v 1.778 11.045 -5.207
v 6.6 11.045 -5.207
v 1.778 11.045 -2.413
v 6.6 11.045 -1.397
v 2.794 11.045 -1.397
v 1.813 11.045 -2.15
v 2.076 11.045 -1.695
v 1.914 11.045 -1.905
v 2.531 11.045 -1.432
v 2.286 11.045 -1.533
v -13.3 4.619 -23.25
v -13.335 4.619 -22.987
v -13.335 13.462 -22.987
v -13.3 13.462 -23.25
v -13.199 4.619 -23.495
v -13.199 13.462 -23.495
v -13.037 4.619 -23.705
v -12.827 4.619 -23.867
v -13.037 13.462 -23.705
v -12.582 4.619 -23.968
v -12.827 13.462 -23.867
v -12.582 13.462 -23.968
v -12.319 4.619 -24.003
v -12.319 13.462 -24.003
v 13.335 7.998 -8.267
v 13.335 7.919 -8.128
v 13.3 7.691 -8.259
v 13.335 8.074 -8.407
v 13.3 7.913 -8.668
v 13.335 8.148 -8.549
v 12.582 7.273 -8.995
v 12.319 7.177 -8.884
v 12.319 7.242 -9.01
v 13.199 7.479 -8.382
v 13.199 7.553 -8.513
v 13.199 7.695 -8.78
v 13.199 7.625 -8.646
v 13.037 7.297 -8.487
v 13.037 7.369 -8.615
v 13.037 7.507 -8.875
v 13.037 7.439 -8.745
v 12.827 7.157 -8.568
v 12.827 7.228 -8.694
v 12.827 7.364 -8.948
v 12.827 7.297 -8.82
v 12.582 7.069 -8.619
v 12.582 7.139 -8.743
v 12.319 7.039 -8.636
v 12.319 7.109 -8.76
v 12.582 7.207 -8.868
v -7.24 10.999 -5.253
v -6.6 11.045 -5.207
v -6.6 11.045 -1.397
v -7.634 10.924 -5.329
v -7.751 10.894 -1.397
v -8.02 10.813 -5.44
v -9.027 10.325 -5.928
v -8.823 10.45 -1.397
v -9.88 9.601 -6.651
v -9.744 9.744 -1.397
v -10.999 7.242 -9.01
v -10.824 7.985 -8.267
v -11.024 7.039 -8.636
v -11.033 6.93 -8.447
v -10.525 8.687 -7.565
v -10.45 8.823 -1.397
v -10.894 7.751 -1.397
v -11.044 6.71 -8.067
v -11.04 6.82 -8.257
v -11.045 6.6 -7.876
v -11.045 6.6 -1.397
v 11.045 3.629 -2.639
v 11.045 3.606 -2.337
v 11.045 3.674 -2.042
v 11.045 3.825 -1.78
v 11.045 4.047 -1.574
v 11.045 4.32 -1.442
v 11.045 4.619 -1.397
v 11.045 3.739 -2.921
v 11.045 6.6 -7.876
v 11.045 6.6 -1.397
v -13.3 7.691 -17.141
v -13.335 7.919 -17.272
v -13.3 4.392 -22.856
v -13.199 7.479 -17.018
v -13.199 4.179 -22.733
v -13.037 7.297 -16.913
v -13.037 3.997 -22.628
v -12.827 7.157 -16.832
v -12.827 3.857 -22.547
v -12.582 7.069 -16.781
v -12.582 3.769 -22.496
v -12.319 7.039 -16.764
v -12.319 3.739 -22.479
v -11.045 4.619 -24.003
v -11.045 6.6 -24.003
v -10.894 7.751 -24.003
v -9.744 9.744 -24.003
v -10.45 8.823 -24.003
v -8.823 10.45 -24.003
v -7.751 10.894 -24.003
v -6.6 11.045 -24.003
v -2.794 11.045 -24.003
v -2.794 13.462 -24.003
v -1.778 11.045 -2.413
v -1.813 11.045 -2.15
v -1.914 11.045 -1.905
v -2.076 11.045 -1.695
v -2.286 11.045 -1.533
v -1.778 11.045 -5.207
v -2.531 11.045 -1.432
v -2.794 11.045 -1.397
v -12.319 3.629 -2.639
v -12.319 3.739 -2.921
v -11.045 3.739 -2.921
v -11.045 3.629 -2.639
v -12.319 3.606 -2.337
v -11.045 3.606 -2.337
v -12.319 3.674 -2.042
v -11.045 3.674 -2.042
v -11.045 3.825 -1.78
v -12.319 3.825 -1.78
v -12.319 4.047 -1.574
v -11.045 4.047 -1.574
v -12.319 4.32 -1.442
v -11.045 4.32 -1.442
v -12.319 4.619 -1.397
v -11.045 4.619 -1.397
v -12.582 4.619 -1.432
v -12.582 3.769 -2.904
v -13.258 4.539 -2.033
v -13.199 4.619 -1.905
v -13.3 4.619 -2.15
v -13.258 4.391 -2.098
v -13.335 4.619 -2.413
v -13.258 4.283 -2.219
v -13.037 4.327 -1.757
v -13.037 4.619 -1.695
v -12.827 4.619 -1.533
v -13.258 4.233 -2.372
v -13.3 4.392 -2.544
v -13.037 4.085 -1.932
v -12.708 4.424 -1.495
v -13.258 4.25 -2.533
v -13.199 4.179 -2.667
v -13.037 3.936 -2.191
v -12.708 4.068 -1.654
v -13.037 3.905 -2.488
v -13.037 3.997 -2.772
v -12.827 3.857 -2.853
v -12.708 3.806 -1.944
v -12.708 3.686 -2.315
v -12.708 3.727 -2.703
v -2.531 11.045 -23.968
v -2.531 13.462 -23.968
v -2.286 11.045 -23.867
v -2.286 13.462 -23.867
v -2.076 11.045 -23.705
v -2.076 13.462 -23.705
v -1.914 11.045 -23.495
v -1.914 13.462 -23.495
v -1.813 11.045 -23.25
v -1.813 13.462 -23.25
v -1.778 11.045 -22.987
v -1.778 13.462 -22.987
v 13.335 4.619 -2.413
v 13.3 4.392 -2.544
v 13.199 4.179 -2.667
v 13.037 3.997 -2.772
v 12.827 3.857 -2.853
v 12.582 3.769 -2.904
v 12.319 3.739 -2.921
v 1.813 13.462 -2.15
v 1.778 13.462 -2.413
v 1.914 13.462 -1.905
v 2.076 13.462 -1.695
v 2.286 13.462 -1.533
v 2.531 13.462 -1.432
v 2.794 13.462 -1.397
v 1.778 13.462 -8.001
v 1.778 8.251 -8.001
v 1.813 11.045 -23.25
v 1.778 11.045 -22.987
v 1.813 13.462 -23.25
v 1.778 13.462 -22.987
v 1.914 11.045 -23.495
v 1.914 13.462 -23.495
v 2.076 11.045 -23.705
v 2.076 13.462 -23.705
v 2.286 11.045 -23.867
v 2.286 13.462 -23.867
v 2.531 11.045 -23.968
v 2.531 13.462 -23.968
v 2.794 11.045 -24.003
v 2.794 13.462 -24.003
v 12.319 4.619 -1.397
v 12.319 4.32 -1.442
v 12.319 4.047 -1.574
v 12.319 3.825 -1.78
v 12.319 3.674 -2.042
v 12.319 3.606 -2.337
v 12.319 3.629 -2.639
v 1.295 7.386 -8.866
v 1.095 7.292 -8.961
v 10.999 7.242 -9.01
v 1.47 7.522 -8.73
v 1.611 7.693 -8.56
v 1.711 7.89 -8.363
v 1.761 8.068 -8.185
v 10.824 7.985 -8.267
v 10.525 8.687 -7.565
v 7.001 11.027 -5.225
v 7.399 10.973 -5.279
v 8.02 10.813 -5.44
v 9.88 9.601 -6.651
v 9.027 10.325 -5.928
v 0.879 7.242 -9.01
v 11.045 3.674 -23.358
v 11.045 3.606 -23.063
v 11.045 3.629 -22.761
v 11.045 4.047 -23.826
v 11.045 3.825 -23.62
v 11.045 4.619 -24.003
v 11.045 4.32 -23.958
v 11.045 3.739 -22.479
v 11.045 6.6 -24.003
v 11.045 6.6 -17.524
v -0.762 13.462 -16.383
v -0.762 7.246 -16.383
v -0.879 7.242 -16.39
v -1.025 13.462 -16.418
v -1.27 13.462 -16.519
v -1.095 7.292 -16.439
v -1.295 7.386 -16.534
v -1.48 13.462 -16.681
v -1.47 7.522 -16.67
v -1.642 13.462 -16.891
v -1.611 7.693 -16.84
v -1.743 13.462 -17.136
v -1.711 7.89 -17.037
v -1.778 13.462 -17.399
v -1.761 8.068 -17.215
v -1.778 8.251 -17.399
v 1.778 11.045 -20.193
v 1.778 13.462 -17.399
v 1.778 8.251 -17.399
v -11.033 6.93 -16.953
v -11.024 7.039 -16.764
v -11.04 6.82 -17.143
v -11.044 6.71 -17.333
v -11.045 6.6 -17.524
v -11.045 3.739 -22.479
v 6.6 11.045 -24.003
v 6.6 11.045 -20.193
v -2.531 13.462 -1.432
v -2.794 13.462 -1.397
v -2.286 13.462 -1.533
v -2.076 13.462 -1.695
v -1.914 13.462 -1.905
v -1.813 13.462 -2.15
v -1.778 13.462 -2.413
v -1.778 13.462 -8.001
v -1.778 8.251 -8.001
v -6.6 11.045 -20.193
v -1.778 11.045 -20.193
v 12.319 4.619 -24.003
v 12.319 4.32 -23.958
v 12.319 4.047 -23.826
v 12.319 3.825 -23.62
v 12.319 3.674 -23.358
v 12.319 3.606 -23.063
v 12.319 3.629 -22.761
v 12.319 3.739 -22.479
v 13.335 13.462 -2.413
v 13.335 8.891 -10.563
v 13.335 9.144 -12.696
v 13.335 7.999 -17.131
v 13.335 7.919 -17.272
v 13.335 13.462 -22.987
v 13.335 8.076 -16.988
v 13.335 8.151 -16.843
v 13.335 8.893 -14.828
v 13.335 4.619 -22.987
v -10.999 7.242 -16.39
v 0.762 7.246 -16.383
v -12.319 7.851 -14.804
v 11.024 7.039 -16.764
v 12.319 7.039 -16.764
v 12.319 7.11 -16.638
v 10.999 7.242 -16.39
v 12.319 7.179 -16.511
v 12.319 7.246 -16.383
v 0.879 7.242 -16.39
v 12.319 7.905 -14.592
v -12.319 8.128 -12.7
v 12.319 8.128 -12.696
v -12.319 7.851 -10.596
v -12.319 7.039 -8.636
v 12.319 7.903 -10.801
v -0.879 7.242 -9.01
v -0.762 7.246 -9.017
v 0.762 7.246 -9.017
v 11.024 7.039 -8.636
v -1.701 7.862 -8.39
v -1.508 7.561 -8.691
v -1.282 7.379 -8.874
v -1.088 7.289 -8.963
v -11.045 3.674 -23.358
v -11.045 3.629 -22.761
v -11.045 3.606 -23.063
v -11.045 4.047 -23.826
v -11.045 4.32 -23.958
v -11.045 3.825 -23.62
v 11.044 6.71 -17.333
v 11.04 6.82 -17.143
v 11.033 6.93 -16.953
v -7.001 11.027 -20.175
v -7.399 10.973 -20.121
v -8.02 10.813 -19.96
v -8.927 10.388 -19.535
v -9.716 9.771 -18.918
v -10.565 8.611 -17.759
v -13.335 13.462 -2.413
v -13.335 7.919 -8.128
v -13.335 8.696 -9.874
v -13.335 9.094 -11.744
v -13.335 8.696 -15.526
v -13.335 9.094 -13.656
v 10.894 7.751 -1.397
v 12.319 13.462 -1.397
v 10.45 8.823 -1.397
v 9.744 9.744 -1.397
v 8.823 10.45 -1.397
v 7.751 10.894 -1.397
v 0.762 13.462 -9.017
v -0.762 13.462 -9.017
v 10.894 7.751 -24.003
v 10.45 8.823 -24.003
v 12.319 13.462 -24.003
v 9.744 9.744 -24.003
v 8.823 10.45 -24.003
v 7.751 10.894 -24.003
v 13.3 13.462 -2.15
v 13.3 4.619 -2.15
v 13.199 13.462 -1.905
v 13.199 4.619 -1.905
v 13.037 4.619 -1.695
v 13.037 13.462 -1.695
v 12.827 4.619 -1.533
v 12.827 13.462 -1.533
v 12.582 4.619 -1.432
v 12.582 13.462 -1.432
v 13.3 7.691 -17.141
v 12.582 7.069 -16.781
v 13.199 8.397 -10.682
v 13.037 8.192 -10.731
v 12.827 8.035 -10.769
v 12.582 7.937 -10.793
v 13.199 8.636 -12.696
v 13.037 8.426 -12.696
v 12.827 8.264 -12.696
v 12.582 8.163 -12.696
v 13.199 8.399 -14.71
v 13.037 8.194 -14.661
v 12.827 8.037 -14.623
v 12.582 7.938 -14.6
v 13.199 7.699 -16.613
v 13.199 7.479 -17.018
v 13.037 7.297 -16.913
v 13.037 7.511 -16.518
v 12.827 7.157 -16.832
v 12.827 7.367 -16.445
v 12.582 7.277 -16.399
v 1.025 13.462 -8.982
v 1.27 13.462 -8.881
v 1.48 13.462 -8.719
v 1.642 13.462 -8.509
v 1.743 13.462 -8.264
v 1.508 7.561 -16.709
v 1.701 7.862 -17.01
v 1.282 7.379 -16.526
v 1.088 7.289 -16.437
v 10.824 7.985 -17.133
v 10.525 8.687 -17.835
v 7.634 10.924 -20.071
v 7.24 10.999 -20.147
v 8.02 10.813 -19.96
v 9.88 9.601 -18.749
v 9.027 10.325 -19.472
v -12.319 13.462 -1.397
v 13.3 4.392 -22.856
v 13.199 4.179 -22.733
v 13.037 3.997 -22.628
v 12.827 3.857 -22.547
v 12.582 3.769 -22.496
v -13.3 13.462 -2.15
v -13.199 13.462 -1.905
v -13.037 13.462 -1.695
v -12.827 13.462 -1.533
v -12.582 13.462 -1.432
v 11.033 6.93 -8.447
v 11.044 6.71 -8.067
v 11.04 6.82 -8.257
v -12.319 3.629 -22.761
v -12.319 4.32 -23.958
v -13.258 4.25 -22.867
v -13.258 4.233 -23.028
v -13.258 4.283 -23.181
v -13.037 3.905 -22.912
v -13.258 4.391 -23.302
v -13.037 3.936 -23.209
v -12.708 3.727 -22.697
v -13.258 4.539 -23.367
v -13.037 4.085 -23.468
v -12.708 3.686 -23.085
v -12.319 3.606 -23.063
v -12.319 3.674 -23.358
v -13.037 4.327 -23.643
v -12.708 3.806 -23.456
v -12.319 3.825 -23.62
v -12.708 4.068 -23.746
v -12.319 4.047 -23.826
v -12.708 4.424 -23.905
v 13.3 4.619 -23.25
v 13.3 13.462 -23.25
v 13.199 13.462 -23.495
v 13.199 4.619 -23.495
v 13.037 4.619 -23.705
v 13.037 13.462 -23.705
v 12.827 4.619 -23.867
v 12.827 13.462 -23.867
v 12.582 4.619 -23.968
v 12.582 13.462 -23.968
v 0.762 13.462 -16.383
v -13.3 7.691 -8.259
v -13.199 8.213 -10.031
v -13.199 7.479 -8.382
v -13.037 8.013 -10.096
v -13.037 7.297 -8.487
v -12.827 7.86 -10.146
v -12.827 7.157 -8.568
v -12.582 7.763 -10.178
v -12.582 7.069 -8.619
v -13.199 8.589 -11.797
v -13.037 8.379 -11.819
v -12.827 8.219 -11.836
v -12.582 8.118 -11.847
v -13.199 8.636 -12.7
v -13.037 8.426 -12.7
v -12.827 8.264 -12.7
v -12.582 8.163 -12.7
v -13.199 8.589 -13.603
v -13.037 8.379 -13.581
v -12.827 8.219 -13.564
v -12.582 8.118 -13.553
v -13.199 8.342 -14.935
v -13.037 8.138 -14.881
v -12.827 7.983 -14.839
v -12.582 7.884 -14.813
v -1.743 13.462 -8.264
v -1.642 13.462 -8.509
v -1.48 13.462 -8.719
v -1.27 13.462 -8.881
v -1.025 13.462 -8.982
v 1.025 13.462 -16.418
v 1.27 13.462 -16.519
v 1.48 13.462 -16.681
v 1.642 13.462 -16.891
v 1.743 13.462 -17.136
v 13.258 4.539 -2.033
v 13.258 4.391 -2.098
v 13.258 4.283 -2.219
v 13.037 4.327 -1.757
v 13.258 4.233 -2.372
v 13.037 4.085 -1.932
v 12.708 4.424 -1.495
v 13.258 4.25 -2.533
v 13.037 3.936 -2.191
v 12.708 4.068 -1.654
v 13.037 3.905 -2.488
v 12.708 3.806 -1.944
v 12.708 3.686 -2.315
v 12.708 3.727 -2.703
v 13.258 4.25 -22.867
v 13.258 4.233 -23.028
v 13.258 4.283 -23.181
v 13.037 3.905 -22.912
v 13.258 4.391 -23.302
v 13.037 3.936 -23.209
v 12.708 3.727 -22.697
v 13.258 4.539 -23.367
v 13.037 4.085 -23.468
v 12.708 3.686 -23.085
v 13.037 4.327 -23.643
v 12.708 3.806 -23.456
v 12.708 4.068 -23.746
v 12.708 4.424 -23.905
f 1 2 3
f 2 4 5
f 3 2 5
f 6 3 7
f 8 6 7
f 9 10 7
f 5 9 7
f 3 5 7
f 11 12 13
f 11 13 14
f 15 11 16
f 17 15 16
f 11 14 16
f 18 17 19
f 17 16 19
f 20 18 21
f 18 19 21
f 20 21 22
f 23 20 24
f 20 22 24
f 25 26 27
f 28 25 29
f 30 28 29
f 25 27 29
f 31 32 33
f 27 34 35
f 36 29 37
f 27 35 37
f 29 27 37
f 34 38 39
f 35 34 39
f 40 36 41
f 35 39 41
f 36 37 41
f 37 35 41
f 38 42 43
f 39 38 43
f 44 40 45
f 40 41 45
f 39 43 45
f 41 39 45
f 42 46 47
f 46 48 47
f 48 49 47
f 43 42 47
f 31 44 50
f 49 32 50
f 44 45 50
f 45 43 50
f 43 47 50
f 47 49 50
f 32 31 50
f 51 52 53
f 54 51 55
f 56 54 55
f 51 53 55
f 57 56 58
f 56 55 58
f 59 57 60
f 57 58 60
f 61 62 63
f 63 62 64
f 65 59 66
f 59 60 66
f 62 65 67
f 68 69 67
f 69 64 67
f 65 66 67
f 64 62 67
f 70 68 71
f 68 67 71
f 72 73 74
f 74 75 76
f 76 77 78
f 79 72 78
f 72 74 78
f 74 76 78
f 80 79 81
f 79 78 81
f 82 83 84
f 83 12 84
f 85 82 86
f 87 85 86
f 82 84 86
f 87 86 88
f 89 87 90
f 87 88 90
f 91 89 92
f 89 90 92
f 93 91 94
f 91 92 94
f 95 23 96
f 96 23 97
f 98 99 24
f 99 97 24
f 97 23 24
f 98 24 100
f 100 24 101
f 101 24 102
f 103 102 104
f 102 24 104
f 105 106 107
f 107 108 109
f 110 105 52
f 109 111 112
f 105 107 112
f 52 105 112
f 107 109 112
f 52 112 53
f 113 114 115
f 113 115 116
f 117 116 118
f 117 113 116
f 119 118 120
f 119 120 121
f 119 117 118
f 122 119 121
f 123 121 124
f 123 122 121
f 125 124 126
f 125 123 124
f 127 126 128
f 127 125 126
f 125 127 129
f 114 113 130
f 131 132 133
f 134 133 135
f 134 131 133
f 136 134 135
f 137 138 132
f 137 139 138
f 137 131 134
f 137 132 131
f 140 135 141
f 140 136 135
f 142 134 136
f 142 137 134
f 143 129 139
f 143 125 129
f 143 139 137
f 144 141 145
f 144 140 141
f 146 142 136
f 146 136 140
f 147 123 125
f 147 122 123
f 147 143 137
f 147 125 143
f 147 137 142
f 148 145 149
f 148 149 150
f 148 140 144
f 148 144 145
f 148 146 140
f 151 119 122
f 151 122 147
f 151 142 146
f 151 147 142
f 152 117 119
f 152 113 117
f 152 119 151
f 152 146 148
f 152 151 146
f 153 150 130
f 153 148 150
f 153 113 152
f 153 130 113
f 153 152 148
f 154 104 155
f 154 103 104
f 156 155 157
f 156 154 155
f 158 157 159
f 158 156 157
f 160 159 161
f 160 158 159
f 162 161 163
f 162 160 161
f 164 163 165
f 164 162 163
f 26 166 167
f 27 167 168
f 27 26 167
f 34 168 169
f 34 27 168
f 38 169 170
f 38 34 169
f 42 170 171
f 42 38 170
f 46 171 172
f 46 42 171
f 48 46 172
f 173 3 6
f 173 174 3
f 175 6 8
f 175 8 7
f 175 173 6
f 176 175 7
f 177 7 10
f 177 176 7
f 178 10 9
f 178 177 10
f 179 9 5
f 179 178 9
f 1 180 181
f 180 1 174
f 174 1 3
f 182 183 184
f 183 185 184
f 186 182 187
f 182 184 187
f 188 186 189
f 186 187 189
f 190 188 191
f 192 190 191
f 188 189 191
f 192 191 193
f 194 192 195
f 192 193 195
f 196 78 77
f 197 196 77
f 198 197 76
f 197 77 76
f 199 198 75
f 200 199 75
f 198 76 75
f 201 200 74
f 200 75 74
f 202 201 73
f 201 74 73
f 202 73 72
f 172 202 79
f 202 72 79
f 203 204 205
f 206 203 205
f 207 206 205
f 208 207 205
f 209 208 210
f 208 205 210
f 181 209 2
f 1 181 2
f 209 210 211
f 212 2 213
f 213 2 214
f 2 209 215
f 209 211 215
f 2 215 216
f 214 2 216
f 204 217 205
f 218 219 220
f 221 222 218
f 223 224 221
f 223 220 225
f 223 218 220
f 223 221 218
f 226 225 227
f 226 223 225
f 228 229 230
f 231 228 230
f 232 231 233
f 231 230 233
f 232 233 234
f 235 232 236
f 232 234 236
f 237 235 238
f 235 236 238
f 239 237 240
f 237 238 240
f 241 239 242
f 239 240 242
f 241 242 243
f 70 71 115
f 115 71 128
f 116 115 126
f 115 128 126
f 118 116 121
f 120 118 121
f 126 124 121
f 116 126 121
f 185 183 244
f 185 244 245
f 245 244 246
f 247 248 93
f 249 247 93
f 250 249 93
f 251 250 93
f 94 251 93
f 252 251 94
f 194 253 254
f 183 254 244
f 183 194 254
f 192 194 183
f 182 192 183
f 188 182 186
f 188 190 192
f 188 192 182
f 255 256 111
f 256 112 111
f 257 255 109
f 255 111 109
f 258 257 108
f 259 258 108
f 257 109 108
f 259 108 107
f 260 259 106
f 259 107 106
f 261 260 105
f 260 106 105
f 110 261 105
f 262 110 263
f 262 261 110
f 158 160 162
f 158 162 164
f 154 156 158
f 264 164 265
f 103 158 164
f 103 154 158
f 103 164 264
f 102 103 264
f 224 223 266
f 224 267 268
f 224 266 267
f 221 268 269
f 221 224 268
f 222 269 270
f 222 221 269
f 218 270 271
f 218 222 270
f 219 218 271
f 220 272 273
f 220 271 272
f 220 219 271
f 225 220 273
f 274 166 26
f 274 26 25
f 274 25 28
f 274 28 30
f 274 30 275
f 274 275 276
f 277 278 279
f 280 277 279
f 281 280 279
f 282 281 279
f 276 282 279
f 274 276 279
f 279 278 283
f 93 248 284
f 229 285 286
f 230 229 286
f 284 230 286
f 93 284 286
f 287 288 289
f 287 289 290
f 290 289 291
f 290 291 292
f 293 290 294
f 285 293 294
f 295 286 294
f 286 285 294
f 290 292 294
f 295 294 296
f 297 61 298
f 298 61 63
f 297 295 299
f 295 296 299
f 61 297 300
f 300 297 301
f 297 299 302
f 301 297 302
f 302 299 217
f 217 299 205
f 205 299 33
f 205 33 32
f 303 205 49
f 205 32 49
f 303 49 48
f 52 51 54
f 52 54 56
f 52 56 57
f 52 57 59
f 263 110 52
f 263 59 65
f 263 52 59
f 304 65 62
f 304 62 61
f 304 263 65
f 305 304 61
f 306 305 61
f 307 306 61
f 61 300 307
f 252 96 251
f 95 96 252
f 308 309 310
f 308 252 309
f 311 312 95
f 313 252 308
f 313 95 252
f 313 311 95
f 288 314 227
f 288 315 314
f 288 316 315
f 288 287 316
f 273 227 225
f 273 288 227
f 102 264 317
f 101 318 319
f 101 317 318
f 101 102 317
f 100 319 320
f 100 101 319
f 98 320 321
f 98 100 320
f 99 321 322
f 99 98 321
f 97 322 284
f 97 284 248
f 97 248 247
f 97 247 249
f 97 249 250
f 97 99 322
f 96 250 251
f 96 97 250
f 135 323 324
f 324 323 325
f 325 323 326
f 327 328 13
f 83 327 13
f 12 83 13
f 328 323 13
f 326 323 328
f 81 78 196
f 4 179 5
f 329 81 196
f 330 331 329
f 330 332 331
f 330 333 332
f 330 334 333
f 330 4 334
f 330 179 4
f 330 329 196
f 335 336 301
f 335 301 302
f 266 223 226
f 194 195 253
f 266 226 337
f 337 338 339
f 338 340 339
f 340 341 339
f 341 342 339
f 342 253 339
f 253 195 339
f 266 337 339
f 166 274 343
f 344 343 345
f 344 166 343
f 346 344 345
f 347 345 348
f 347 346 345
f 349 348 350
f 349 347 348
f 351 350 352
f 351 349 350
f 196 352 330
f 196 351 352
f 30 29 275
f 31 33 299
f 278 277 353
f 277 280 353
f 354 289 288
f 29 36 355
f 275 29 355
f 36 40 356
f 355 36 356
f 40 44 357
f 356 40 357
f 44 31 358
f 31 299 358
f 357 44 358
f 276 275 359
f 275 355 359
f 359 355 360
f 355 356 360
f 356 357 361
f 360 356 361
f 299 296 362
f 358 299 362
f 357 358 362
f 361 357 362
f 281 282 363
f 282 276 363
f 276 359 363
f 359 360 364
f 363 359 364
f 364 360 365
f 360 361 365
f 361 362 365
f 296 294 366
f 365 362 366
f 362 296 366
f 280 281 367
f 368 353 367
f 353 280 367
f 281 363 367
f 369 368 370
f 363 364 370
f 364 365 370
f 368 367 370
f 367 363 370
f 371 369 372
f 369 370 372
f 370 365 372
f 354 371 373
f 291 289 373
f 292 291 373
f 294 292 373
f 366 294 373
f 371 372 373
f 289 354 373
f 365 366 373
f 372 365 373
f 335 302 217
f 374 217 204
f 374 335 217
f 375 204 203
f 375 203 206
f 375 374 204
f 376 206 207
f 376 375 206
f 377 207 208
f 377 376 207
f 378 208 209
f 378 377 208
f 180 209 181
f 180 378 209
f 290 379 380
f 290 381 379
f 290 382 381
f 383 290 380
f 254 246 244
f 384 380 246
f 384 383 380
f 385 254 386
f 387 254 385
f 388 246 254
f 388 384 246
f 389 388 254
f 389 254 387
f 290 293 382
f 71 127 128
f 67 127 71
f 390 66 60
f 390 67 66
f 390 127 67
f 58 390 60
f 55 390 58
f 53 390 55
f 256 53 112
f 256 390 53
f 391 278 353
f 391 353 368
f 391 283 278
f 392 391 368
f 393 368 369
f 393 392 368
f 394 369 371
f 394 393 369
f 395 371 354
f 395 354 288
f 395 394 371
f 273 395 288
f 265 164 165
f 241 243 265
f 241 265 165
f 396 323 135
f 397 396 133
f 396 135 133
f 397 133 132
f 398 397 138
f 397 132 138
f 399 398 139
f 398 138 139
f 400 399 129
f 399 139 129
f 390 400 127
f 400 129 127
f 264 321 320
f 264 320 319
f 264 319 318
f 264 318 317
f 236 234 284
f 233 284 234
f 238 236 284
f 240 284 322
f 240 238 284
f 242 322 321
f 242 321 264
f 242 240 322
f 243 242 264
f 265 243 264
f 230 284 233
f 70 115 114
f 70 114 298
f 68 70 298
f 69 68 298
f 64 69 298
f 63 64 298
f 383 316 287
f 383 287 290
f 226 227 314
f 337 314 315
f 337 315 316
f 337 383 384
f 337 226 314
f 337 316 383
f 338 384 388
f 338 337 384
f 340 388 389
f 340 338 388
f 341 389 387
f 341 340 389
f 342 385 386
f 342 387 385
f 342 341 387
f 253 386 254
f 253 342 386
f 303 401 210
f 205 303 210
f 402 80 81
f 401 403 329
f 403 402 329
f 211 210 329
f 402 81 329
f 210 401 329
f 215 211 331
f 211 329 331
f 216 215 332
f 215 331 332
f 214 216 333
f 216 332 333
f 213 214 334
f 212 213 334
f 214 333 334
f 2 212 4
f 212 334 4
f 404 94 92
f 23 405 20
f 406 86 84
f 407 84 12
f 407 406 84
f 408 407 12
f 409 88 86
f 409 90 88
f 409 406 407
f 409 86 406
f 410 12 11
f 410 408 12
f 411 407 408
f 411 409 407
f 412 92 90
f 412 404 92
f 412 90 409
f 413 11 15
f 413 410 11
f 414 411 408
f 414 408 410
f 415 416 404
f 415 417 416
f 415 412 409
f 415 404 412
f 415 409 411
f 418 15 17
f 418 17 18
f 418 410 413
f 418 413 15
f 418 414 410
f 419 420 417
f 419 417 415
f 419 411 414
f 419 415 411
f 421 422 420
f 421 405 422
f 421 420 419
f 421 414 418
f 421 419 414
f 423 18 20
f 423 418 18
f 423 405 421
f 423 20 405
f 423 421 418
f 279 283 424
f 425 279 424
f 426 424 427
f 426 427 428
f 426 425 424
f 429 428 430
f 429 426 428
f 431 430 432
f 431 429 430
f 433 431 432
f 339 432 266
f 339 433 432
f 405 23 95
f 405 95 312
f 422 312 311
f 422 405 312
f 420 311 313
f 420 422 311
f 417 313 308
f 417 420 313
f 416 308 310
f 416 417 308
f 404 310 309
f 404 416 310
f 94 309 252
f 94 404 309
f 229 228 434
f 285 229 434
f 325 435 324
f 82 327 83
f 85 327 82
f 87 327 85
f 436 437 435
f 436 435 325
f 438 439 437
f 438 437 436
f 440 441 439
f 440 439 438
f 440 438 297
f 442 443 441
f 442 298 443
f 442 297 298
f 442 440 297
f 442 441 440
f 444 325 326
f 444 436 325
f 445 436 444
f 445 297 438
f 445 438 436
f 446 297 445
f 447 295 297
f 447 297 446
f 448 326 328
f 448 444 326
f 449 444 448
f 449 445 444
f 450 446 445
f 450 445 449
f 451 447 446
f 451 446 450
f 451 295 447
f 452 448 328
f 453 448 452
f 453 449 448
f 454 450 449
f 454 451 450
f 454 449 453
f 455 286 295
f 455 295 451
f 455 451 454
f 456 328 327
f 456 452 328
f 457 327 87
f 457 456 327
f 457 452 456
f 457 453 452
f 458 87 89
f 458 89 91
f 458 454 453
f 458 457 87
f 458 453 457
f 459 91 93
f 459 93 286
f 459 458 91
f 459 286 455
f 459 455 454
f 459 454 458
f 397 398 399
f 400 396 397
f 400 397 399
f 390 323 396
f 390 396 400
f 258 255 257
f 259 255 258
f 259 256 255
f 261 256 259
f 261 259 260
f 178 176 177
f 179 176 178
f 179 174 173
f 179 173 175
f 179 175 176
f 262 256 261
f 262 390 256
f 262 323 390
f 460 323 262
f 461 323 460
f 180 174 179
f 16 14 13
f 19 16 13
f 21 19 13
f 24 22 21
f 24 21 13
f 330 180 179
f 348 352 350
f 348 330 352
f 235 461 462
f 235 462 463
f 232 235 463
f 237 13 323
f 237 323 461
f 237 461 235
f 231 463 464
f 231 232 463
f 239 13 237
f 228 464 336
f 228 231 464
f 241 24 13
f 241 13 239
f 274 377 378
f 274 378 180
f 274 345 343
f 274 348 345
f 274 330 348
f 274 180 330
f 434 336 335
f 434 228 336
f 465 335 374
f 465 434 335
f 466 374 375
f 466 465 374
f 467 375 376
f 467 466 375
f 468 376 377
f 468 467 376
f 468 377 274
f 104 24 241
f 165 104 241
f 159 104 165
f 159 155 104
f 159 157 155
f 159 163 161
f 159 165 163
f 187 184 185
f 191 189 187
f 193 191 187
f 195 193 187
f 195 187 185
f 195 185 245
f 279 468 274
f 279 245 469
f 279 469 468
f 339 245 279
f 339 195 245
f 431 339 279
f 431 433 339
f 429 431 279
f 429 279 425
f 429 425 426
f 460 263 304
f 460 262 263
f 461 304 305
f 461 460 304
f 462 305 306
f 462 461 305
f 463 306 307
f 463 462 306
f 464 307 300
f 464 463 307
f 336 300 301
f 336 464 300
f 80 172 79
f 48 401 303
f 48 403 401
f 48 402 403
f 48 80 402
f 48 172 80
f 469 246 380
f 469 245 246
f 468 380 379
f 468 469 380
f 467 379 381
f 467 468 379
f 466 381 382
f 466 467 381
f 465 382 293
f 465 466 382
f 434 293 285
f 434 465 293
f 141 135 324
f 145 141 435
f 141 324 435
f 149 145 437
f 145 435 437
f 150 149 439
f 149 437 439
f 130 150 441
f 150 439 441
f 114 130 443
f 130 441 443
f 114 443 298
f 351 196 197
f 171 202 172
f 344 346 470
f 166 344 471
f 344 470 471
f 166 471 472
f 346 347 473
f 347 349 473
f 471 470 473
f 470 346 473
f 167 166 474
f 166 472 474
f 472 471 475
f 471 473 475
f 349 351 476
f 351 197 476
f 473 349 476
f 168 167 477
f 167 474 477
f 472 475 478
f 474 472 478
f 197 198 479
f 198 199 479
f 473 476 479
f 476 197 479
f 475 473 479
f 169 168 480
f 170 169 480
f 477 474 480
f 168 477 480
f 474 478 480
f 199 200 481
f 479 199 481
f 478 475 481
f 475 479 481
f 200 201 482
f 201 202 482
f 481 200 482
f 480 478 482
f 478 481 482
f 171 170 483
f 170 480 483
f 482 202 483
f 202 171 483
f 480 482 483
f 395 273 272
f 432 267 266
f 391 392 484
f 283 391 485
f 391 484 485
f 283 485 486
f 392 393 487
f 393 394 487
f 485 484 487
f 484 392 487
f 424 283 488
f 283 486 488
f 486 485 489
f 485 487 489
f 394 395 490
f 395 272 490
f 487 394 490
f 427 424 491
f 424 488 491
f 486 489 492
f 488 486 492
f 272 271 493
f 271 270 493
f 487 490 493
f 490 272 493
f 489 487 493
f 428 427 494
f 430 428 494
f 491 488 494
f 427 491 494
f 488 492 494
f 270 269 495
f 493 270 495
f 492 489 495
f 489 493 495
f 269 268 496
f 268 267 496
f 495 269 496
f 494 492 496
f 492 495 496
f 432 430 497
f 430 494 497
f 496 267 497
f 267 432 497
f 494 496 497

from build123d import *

# Parameters (mm, degrees)
SKETCH23_W          = 26.67
SKETCH23_H          = 22.606
BOSS_EXTRUDE8_DEPTH = 13.208
CUT_EXTRUDE1_DEPTH  = 7.62
SKETCH27_R          = 8.128
CUT_EXTRUDE3_DEPTH  = 38.1
CUT_EXTRUDE4_DEPTH  = 76.2
CHAMFER1_SIZE       = 3.81
FILLET1_R           = 1.016
FILLET2_R           = 1.016
FILLET4_R           = 1.016


with BuildPart() as part:
    # Sketch23 → Boss-Extrude8 (new body)
    with BuildSketch(Plane(origin=(0, 13.462, 0), x_dir=(1, 0, 0), z_dir=(0, 1, 0))):
        with Locations((0, 12.7)):
            Rectangle(SKETCH23_W, SKETCH23_H)
    extrude(amount=-BOSS_EXTRUDE8_DEPTH)

    # Sketch25 → Cut-Extrude1 (cut)
    with BuildSketch(Plane(origin=(0, 0, -24.003), x_dir=(-1, 0, 0), z_dir=(0, 0, -1))):
        with BuildLine():
            Line((1.778, 13.462), (1.778, 11.045488249))
            Line((1.778, 11.045488249), (6.600488249, 11.045488249))
            ThreePointArc((6.600488249, 11.045488249), (9.743577891, 9.743577891), (11.045488249, 6.600488249))
            Line((11.045488249, 6.600488249), (11.045488249, 0.254))
            Line((11.045488249, 0.254), (-11.045488249, 0.254))
            Line((-11.045488249, 0.254), (-11.045488249, 6.600488249))
            ThreePointArc((-11.045488249, 6.600488249), (-9.743577891, 9.743577891), (-6.600488249, 11.045488249))
            Line((-6.600488249, 11.045488249), (-1.778, 11.045488249))
            Line((-1.778, 11.045488249), (-1.778, 13.462))
            ThreePointArc((-1.778, 13.462), (0, 15.24), (1.778, 13.462))
        make_face()
    cut_extrude1 = extrude(amount=-CUT_EXTRUDE1_DEPTH, mode=Mode.SUBTRACT)

    # Sketch27 → Cut-Extrude3 (cut, symmetric)
    with BuildSketch(Plane(origin=(0, 0, 0), x_dir=(0, 0, -1), z_dir=(1, 0, 0))):
        with Locations((12.7, 0)):
            Circle(SKETCH27_R)
    extrude(amount=CUT_EXTRUDE3_DEPTH, both=True, mode=Mode.SUBTRACT)

    # Sketch28 → Cut-Extrude4 (cut)
    with BuildSketch(Plane(origin=(13.335, 0, 0), x_dir=(0, 0, -1), z_dir=(1, 0, 0))):
        with BuildLine():
            Line((1.397, 2.859615883), (8.636, 7.039054482))
            ThreePointArc((8.636, 7.039054482), (12.7, 8.128), (16.764, 7.039054482))
            Line((16.764, 7.039054482), (24.003, 2.859615883))
            Line((24.003, 2.859615883), (24.003, 0.254))
            Line((24.003, 0.254), (1.397, 0.254))
            Line((1.397, 0.254), (1.397, 2.859615883))
        make_face()
    extrude(amount=-CUT_EXTRUDE4_DEPTH, mode=Mode.SUBTRACT)

    # Mirror1: Cut-Extrude1 across plane
    add(cut_extrude1.mirror(Plane.XY.offset(-12.7)), mode=Mode.SUBTRACT)

    # Chamfer1
    # the kernel refuses this chamfer: 3.81 mm, written as the material it adds along each edge
    with BuildSketch(Plane(origin=(8.020112184, 11.045488249, -16.383), x_dir=(0, -1, 0), z_dir=(-1, 0, 0))) as chamfer1_piece_1_section:
        Polygon((CHAMFER1_SIZE, 0), (0, -CHAMFER1_SIZE), (0, 0), align=None)
    chamfer1_piece_1 = extrude(amount=24.418712617, mode=Mode.PRIVATE)
    chamfer1_piece_1 = split(chamfer1_piece_1, bisect_by=Plane(origin=(1.778, 11.045488249, -16.383), z_dir=(1, 0, 0)), keep=Keep.TOP, mode=Mode.PRIVATE)
    chamfer1_piece_1 = chamfer1_piece_1 - Plane(origin=(8.020112184, 0, -12.7), x_dir=(0, 0, -1), z_dir=(1, 0, 0)) * Cylinder(8.128, 65, mode=Mode.PRIVATE)
    add(chamfer1_piece_1)
    with BuildSketch(Plane(origin=(-1.778, 11.045488249, -16.383), x_dir=(0, -1, 0), z_dir=(-1, 0, 0))) as chamfer1_piece_2_section:
        Polygon((CHAMFER1_SIZE, 0), (0, -CHAMFER1_SIZE), (0, 0), align=None)
    chamfer1_piece_2 = extrude(amount=14.620600433, mode=Mode.PRIVATE)
    chamfer1_piece_2 = split(chamfer1_piece_2, bisect_by=Plane(origin=(-13.335, 11.045488249, -16.383), z_dir=(1, 0, 0)), keep=Keep.TOP, mode=Mode.PRIVATE)
    chamfer1_piece_2 = chamfer1_piece_2 - Plane(origin=(-1.778, 0, -12.7), x_dir=(0, 0, -1), z_dir=(1, 0, 0)) * Cylinder(8.128, 45, mode=Mode.PRIVATE)
    add(chamfer1_piece_2)
    with BuildSketch(Plane(origin=(16.398600433, 11.045488249, -16.383), x_dir=(0, -1, 0), z_dir=(-1, 0, 0))) as chamfer1_piece_3_section:
        Polygon((CHAMFER1_SIZE, 0), (0, -CHAMFER1_SIZE), (0, 0), align=None)
    chamfer1_piece_3 = extrude(amount=14.620600433, mode=Mode.PRIVATE)
    chamfer1_piece_3 = split(chamfer1_piece_3, bisect_by=Plane(origin=(13.335, 11.045488249, -16.383), z_dir=(-1, 0, 0)), keep=Keep.TOP, mode=Mode.PRIVATE)
    chamfer1_piece_3 = chamfer1_piece_3 - Plane(origin=(16.398600433, 0, -12.7), x_dir=(0, 0, -1), z_dir=(1, 0, 0)) * Cylinder(8.128, 45, mode=Mode.PRIVATE)
    add(chamfer1_piece_3)
    with BuildSketch(Plane(origin=(16.398600433, 11.045488249, -16.383), x_dir=(0, -1, 0), z_dir=(-1, 0, 0))) as chamfer1_piece_4_section:
        Polygon((CHAMFER1_SIZE, 0), (0, -CHAMFER1_SIZE), (0, 0), align=None)
    chamfer1_piece_4 = extrude(amount=24.418712617, mode=Mode.PRIVATE)
    chamfer1_piece_4 = split(chamfer1_piece_4, bisect_by=Plane(origin=(-1.778, 11.045488249, -16.383), z_dir=(-1, 0, 0)), keep=Keep.TOP, mode=Mode.PRIVATE)
    chamfer1_piece_4 = chamfer1_piece_4 - Plane(origin=(16.398600433, 0, -12.7), x_dir=(0, 0, -1), z_dir=(1, 0, 0)) * Cylinder(8.128, 65, mode=Mode.PRIVATE)
    add(chamfer1_piece_4)
    with BuildSketch(Plane(origin=(8.020112184, 11.045488249, -9.017), x_dir=(0, 0, 1), z_dir=(-1, 0, 0))) as chamfer1_piece_5_section:
        Polygon((CHAMFER1_SIZE, 0), (0, -CHAMFER1_SIZE), (0, 0), align=None)
    chamfer1_piece_5 = extrude(amount=24.418712617, mode=Mode.PRIVATE)
    chamfer1_piece_5 = split(chamfer1_piece_5, bisect_by=Plane(origin=(1.778, 11.045488249, -9.017), z_dir=(1, 0, 0)), keep=Keep.TOP, mode=Mode.PRIVATE)
    chamfer1_piece_5 = chamfer1_piece_5 - Plane(origin=(8.020112184, 0, -12.7), x_dir=(0, 0, -1), z_dir=(1, 0, 0)) * Cylinder(8.128, 65, mode=Mode.PRIVATE)
    add(chamfer1_piece_5)
    with BuildSketch(Plane(origin=(-1.778, 11.045488249, -9.017), x_dir=(0, 0, 1), z_dir=(-1, 0, 0))) as chamfer1_piece_6_section:
        Polygon((CHAMFER1_SIZE, 0), (0, -CHAMFER1_SIZE), (0, 0), align=None)
    chamfer1_piece_6 = extrude(amount=14.620600433, mode=Mode.PRIVATE)
    chamfer1_piece_6 = split(chamfer1_piece_6, bisect_by=Plane(origin=(-13.335, 11.045488249, -9.017), z_dir=(1, 0, 0)), keep=Keep.TOP, mode=Mode.PRIVATE)
    chamfer1_piece_6 = chamfer1_piece_6 - Plane(origin=(-1.778, 0, -12.7), x_dir=(0, 0, -1), z_dir=(1, 0, 0)) * Cylinder(8.128, 45, mode=Mode.PRIVATE)
    add(chamfer1_piece_6)
    with BuildSketch(Plane(origin=(16.398600433, 11.045488249, -9.017), x_dir=(0, -1, 0), z_dir=(-1, 0, 0))) as chamfer1_piece_7_section:
        Polygon((CHAMFER1_SIZE, 0), (0, CHAMFER1_SIZE), (0, 0), align=None)
    chamfer1_piece_7 = extrude(amount=14.620600433, mode=Mode.PRIVATE)
    chamfer1_piece_7 = split(chamfer1_piece_7, bisect_by=Plane(origin=(13.335, 11.045488249, -9.017), z_dir=(-1, 0, 0)), keep=Keep.TOP, mode=Mode.PRIVATE)
    chamfer1_piece_7 = chamfer1_piece_7 - Plane(origin=(16.398600433, 0, -12.7), x_dir=(0, 0, -1), z_dir=(1, 0, 0)) * Cylinder(8.128, 45, mode=Mode.PRIVATE)
    add(chamfer1_piece_7)
    with BuildSketch(Plane(origin=(16.398600433, 11.045488249, -9.017), x_dir=(0, -1, 0), z_dir=(-1, 0, 0))) as chamfer1_piece_8_section:
        Polygon((CHAMFER1_SIZE, 0), (0, CHAMFER1_SIZE), (0, 0), align=None)
    chamfer1_piece_8 = extrude(amount=24.418712617, mode=Mode.PRIVATE)
    chamfer1_piece_8 = split(chamfer1_piece_8, bisect_by=Plane(origin=(-1.778, 11.045488249, -9.017), z_dir=(-1, 0, 0)), keep=Keep.TOP, mode=Mode.PRIVATE)
    chamfer1_piece_8 = chamfer1_piece_8 - Plane(origin=(16.398600433, 0, -12.7), x_dir=(0, 0, -1), z_dir=(1, 0, 0)) * Cylinder(8.128, 65, mode=Mode.PRIVATE)
    add(chamfer1_piece_8)

    # Fillet1
    fillet1_edges = [part.edges().sort_by_distance(p)[0] for p in [
        (12.190244124, 2.859615883, -1.397),
        (-12.190244124, 2.859615883, -24.003),
        (12.190244124, 2.859615883, -24.003),
        (-12.190244124, 2.859615883, -1.397),
    ]]
    fillet(fillet1_edges, radius=FILLET1_R)

    # Fillet2
    fillet2_edges = [part.edges().sort_by_distance(p)[0] for p in [
        (1.778, 10.353840564, -9.017),
        (-1.778, 10.353840564, -9.017),
        (1.778, 12.253744124, -1.397),
        (-1.778, 12.253744124, -1.397),
        (1.778, 10.353840564, -16.383),
        (-1.778, 10.353840564, -16.383),
        (-1.778, 12.253744124, -24.003),
        (1.778, 12.253744124, -24.003),
    ]]
    fillet(fillet2_edges, radius=FILLET2_R)

    # Fillet4
    fillet4_edges = [part.edges().sort_by_distance(p)[0] for p in [
        (13.335, 9.040689752, -1.397),
        (13.335, 5.389276088, -5.7785),
        (13.335, 5.389276088, -19.6215),
        (13.335, 9.040689752, -24.003),
        (13.335, 3.739497694, -23.495),
        (13.335, 3.739497694, -1.905),
        (-13.335, 9.040689752, -1.397),
        (-13.335, 9.040689752, -24.003),
        (-13.335, 3.739497694, -23.495),
        (-13.335, 3.739497694, -1.905),
        (13.335, 8.128, -12.7),
        (-13.335, 8.128, -12.7),
        (-13.335, 5.389276088, -19.6215),
        (-13.335, 5.389276088, -5.7785),
    ]]
    fillet(fillet4_edges, radius=FILLET4_R)


solid = part.part
